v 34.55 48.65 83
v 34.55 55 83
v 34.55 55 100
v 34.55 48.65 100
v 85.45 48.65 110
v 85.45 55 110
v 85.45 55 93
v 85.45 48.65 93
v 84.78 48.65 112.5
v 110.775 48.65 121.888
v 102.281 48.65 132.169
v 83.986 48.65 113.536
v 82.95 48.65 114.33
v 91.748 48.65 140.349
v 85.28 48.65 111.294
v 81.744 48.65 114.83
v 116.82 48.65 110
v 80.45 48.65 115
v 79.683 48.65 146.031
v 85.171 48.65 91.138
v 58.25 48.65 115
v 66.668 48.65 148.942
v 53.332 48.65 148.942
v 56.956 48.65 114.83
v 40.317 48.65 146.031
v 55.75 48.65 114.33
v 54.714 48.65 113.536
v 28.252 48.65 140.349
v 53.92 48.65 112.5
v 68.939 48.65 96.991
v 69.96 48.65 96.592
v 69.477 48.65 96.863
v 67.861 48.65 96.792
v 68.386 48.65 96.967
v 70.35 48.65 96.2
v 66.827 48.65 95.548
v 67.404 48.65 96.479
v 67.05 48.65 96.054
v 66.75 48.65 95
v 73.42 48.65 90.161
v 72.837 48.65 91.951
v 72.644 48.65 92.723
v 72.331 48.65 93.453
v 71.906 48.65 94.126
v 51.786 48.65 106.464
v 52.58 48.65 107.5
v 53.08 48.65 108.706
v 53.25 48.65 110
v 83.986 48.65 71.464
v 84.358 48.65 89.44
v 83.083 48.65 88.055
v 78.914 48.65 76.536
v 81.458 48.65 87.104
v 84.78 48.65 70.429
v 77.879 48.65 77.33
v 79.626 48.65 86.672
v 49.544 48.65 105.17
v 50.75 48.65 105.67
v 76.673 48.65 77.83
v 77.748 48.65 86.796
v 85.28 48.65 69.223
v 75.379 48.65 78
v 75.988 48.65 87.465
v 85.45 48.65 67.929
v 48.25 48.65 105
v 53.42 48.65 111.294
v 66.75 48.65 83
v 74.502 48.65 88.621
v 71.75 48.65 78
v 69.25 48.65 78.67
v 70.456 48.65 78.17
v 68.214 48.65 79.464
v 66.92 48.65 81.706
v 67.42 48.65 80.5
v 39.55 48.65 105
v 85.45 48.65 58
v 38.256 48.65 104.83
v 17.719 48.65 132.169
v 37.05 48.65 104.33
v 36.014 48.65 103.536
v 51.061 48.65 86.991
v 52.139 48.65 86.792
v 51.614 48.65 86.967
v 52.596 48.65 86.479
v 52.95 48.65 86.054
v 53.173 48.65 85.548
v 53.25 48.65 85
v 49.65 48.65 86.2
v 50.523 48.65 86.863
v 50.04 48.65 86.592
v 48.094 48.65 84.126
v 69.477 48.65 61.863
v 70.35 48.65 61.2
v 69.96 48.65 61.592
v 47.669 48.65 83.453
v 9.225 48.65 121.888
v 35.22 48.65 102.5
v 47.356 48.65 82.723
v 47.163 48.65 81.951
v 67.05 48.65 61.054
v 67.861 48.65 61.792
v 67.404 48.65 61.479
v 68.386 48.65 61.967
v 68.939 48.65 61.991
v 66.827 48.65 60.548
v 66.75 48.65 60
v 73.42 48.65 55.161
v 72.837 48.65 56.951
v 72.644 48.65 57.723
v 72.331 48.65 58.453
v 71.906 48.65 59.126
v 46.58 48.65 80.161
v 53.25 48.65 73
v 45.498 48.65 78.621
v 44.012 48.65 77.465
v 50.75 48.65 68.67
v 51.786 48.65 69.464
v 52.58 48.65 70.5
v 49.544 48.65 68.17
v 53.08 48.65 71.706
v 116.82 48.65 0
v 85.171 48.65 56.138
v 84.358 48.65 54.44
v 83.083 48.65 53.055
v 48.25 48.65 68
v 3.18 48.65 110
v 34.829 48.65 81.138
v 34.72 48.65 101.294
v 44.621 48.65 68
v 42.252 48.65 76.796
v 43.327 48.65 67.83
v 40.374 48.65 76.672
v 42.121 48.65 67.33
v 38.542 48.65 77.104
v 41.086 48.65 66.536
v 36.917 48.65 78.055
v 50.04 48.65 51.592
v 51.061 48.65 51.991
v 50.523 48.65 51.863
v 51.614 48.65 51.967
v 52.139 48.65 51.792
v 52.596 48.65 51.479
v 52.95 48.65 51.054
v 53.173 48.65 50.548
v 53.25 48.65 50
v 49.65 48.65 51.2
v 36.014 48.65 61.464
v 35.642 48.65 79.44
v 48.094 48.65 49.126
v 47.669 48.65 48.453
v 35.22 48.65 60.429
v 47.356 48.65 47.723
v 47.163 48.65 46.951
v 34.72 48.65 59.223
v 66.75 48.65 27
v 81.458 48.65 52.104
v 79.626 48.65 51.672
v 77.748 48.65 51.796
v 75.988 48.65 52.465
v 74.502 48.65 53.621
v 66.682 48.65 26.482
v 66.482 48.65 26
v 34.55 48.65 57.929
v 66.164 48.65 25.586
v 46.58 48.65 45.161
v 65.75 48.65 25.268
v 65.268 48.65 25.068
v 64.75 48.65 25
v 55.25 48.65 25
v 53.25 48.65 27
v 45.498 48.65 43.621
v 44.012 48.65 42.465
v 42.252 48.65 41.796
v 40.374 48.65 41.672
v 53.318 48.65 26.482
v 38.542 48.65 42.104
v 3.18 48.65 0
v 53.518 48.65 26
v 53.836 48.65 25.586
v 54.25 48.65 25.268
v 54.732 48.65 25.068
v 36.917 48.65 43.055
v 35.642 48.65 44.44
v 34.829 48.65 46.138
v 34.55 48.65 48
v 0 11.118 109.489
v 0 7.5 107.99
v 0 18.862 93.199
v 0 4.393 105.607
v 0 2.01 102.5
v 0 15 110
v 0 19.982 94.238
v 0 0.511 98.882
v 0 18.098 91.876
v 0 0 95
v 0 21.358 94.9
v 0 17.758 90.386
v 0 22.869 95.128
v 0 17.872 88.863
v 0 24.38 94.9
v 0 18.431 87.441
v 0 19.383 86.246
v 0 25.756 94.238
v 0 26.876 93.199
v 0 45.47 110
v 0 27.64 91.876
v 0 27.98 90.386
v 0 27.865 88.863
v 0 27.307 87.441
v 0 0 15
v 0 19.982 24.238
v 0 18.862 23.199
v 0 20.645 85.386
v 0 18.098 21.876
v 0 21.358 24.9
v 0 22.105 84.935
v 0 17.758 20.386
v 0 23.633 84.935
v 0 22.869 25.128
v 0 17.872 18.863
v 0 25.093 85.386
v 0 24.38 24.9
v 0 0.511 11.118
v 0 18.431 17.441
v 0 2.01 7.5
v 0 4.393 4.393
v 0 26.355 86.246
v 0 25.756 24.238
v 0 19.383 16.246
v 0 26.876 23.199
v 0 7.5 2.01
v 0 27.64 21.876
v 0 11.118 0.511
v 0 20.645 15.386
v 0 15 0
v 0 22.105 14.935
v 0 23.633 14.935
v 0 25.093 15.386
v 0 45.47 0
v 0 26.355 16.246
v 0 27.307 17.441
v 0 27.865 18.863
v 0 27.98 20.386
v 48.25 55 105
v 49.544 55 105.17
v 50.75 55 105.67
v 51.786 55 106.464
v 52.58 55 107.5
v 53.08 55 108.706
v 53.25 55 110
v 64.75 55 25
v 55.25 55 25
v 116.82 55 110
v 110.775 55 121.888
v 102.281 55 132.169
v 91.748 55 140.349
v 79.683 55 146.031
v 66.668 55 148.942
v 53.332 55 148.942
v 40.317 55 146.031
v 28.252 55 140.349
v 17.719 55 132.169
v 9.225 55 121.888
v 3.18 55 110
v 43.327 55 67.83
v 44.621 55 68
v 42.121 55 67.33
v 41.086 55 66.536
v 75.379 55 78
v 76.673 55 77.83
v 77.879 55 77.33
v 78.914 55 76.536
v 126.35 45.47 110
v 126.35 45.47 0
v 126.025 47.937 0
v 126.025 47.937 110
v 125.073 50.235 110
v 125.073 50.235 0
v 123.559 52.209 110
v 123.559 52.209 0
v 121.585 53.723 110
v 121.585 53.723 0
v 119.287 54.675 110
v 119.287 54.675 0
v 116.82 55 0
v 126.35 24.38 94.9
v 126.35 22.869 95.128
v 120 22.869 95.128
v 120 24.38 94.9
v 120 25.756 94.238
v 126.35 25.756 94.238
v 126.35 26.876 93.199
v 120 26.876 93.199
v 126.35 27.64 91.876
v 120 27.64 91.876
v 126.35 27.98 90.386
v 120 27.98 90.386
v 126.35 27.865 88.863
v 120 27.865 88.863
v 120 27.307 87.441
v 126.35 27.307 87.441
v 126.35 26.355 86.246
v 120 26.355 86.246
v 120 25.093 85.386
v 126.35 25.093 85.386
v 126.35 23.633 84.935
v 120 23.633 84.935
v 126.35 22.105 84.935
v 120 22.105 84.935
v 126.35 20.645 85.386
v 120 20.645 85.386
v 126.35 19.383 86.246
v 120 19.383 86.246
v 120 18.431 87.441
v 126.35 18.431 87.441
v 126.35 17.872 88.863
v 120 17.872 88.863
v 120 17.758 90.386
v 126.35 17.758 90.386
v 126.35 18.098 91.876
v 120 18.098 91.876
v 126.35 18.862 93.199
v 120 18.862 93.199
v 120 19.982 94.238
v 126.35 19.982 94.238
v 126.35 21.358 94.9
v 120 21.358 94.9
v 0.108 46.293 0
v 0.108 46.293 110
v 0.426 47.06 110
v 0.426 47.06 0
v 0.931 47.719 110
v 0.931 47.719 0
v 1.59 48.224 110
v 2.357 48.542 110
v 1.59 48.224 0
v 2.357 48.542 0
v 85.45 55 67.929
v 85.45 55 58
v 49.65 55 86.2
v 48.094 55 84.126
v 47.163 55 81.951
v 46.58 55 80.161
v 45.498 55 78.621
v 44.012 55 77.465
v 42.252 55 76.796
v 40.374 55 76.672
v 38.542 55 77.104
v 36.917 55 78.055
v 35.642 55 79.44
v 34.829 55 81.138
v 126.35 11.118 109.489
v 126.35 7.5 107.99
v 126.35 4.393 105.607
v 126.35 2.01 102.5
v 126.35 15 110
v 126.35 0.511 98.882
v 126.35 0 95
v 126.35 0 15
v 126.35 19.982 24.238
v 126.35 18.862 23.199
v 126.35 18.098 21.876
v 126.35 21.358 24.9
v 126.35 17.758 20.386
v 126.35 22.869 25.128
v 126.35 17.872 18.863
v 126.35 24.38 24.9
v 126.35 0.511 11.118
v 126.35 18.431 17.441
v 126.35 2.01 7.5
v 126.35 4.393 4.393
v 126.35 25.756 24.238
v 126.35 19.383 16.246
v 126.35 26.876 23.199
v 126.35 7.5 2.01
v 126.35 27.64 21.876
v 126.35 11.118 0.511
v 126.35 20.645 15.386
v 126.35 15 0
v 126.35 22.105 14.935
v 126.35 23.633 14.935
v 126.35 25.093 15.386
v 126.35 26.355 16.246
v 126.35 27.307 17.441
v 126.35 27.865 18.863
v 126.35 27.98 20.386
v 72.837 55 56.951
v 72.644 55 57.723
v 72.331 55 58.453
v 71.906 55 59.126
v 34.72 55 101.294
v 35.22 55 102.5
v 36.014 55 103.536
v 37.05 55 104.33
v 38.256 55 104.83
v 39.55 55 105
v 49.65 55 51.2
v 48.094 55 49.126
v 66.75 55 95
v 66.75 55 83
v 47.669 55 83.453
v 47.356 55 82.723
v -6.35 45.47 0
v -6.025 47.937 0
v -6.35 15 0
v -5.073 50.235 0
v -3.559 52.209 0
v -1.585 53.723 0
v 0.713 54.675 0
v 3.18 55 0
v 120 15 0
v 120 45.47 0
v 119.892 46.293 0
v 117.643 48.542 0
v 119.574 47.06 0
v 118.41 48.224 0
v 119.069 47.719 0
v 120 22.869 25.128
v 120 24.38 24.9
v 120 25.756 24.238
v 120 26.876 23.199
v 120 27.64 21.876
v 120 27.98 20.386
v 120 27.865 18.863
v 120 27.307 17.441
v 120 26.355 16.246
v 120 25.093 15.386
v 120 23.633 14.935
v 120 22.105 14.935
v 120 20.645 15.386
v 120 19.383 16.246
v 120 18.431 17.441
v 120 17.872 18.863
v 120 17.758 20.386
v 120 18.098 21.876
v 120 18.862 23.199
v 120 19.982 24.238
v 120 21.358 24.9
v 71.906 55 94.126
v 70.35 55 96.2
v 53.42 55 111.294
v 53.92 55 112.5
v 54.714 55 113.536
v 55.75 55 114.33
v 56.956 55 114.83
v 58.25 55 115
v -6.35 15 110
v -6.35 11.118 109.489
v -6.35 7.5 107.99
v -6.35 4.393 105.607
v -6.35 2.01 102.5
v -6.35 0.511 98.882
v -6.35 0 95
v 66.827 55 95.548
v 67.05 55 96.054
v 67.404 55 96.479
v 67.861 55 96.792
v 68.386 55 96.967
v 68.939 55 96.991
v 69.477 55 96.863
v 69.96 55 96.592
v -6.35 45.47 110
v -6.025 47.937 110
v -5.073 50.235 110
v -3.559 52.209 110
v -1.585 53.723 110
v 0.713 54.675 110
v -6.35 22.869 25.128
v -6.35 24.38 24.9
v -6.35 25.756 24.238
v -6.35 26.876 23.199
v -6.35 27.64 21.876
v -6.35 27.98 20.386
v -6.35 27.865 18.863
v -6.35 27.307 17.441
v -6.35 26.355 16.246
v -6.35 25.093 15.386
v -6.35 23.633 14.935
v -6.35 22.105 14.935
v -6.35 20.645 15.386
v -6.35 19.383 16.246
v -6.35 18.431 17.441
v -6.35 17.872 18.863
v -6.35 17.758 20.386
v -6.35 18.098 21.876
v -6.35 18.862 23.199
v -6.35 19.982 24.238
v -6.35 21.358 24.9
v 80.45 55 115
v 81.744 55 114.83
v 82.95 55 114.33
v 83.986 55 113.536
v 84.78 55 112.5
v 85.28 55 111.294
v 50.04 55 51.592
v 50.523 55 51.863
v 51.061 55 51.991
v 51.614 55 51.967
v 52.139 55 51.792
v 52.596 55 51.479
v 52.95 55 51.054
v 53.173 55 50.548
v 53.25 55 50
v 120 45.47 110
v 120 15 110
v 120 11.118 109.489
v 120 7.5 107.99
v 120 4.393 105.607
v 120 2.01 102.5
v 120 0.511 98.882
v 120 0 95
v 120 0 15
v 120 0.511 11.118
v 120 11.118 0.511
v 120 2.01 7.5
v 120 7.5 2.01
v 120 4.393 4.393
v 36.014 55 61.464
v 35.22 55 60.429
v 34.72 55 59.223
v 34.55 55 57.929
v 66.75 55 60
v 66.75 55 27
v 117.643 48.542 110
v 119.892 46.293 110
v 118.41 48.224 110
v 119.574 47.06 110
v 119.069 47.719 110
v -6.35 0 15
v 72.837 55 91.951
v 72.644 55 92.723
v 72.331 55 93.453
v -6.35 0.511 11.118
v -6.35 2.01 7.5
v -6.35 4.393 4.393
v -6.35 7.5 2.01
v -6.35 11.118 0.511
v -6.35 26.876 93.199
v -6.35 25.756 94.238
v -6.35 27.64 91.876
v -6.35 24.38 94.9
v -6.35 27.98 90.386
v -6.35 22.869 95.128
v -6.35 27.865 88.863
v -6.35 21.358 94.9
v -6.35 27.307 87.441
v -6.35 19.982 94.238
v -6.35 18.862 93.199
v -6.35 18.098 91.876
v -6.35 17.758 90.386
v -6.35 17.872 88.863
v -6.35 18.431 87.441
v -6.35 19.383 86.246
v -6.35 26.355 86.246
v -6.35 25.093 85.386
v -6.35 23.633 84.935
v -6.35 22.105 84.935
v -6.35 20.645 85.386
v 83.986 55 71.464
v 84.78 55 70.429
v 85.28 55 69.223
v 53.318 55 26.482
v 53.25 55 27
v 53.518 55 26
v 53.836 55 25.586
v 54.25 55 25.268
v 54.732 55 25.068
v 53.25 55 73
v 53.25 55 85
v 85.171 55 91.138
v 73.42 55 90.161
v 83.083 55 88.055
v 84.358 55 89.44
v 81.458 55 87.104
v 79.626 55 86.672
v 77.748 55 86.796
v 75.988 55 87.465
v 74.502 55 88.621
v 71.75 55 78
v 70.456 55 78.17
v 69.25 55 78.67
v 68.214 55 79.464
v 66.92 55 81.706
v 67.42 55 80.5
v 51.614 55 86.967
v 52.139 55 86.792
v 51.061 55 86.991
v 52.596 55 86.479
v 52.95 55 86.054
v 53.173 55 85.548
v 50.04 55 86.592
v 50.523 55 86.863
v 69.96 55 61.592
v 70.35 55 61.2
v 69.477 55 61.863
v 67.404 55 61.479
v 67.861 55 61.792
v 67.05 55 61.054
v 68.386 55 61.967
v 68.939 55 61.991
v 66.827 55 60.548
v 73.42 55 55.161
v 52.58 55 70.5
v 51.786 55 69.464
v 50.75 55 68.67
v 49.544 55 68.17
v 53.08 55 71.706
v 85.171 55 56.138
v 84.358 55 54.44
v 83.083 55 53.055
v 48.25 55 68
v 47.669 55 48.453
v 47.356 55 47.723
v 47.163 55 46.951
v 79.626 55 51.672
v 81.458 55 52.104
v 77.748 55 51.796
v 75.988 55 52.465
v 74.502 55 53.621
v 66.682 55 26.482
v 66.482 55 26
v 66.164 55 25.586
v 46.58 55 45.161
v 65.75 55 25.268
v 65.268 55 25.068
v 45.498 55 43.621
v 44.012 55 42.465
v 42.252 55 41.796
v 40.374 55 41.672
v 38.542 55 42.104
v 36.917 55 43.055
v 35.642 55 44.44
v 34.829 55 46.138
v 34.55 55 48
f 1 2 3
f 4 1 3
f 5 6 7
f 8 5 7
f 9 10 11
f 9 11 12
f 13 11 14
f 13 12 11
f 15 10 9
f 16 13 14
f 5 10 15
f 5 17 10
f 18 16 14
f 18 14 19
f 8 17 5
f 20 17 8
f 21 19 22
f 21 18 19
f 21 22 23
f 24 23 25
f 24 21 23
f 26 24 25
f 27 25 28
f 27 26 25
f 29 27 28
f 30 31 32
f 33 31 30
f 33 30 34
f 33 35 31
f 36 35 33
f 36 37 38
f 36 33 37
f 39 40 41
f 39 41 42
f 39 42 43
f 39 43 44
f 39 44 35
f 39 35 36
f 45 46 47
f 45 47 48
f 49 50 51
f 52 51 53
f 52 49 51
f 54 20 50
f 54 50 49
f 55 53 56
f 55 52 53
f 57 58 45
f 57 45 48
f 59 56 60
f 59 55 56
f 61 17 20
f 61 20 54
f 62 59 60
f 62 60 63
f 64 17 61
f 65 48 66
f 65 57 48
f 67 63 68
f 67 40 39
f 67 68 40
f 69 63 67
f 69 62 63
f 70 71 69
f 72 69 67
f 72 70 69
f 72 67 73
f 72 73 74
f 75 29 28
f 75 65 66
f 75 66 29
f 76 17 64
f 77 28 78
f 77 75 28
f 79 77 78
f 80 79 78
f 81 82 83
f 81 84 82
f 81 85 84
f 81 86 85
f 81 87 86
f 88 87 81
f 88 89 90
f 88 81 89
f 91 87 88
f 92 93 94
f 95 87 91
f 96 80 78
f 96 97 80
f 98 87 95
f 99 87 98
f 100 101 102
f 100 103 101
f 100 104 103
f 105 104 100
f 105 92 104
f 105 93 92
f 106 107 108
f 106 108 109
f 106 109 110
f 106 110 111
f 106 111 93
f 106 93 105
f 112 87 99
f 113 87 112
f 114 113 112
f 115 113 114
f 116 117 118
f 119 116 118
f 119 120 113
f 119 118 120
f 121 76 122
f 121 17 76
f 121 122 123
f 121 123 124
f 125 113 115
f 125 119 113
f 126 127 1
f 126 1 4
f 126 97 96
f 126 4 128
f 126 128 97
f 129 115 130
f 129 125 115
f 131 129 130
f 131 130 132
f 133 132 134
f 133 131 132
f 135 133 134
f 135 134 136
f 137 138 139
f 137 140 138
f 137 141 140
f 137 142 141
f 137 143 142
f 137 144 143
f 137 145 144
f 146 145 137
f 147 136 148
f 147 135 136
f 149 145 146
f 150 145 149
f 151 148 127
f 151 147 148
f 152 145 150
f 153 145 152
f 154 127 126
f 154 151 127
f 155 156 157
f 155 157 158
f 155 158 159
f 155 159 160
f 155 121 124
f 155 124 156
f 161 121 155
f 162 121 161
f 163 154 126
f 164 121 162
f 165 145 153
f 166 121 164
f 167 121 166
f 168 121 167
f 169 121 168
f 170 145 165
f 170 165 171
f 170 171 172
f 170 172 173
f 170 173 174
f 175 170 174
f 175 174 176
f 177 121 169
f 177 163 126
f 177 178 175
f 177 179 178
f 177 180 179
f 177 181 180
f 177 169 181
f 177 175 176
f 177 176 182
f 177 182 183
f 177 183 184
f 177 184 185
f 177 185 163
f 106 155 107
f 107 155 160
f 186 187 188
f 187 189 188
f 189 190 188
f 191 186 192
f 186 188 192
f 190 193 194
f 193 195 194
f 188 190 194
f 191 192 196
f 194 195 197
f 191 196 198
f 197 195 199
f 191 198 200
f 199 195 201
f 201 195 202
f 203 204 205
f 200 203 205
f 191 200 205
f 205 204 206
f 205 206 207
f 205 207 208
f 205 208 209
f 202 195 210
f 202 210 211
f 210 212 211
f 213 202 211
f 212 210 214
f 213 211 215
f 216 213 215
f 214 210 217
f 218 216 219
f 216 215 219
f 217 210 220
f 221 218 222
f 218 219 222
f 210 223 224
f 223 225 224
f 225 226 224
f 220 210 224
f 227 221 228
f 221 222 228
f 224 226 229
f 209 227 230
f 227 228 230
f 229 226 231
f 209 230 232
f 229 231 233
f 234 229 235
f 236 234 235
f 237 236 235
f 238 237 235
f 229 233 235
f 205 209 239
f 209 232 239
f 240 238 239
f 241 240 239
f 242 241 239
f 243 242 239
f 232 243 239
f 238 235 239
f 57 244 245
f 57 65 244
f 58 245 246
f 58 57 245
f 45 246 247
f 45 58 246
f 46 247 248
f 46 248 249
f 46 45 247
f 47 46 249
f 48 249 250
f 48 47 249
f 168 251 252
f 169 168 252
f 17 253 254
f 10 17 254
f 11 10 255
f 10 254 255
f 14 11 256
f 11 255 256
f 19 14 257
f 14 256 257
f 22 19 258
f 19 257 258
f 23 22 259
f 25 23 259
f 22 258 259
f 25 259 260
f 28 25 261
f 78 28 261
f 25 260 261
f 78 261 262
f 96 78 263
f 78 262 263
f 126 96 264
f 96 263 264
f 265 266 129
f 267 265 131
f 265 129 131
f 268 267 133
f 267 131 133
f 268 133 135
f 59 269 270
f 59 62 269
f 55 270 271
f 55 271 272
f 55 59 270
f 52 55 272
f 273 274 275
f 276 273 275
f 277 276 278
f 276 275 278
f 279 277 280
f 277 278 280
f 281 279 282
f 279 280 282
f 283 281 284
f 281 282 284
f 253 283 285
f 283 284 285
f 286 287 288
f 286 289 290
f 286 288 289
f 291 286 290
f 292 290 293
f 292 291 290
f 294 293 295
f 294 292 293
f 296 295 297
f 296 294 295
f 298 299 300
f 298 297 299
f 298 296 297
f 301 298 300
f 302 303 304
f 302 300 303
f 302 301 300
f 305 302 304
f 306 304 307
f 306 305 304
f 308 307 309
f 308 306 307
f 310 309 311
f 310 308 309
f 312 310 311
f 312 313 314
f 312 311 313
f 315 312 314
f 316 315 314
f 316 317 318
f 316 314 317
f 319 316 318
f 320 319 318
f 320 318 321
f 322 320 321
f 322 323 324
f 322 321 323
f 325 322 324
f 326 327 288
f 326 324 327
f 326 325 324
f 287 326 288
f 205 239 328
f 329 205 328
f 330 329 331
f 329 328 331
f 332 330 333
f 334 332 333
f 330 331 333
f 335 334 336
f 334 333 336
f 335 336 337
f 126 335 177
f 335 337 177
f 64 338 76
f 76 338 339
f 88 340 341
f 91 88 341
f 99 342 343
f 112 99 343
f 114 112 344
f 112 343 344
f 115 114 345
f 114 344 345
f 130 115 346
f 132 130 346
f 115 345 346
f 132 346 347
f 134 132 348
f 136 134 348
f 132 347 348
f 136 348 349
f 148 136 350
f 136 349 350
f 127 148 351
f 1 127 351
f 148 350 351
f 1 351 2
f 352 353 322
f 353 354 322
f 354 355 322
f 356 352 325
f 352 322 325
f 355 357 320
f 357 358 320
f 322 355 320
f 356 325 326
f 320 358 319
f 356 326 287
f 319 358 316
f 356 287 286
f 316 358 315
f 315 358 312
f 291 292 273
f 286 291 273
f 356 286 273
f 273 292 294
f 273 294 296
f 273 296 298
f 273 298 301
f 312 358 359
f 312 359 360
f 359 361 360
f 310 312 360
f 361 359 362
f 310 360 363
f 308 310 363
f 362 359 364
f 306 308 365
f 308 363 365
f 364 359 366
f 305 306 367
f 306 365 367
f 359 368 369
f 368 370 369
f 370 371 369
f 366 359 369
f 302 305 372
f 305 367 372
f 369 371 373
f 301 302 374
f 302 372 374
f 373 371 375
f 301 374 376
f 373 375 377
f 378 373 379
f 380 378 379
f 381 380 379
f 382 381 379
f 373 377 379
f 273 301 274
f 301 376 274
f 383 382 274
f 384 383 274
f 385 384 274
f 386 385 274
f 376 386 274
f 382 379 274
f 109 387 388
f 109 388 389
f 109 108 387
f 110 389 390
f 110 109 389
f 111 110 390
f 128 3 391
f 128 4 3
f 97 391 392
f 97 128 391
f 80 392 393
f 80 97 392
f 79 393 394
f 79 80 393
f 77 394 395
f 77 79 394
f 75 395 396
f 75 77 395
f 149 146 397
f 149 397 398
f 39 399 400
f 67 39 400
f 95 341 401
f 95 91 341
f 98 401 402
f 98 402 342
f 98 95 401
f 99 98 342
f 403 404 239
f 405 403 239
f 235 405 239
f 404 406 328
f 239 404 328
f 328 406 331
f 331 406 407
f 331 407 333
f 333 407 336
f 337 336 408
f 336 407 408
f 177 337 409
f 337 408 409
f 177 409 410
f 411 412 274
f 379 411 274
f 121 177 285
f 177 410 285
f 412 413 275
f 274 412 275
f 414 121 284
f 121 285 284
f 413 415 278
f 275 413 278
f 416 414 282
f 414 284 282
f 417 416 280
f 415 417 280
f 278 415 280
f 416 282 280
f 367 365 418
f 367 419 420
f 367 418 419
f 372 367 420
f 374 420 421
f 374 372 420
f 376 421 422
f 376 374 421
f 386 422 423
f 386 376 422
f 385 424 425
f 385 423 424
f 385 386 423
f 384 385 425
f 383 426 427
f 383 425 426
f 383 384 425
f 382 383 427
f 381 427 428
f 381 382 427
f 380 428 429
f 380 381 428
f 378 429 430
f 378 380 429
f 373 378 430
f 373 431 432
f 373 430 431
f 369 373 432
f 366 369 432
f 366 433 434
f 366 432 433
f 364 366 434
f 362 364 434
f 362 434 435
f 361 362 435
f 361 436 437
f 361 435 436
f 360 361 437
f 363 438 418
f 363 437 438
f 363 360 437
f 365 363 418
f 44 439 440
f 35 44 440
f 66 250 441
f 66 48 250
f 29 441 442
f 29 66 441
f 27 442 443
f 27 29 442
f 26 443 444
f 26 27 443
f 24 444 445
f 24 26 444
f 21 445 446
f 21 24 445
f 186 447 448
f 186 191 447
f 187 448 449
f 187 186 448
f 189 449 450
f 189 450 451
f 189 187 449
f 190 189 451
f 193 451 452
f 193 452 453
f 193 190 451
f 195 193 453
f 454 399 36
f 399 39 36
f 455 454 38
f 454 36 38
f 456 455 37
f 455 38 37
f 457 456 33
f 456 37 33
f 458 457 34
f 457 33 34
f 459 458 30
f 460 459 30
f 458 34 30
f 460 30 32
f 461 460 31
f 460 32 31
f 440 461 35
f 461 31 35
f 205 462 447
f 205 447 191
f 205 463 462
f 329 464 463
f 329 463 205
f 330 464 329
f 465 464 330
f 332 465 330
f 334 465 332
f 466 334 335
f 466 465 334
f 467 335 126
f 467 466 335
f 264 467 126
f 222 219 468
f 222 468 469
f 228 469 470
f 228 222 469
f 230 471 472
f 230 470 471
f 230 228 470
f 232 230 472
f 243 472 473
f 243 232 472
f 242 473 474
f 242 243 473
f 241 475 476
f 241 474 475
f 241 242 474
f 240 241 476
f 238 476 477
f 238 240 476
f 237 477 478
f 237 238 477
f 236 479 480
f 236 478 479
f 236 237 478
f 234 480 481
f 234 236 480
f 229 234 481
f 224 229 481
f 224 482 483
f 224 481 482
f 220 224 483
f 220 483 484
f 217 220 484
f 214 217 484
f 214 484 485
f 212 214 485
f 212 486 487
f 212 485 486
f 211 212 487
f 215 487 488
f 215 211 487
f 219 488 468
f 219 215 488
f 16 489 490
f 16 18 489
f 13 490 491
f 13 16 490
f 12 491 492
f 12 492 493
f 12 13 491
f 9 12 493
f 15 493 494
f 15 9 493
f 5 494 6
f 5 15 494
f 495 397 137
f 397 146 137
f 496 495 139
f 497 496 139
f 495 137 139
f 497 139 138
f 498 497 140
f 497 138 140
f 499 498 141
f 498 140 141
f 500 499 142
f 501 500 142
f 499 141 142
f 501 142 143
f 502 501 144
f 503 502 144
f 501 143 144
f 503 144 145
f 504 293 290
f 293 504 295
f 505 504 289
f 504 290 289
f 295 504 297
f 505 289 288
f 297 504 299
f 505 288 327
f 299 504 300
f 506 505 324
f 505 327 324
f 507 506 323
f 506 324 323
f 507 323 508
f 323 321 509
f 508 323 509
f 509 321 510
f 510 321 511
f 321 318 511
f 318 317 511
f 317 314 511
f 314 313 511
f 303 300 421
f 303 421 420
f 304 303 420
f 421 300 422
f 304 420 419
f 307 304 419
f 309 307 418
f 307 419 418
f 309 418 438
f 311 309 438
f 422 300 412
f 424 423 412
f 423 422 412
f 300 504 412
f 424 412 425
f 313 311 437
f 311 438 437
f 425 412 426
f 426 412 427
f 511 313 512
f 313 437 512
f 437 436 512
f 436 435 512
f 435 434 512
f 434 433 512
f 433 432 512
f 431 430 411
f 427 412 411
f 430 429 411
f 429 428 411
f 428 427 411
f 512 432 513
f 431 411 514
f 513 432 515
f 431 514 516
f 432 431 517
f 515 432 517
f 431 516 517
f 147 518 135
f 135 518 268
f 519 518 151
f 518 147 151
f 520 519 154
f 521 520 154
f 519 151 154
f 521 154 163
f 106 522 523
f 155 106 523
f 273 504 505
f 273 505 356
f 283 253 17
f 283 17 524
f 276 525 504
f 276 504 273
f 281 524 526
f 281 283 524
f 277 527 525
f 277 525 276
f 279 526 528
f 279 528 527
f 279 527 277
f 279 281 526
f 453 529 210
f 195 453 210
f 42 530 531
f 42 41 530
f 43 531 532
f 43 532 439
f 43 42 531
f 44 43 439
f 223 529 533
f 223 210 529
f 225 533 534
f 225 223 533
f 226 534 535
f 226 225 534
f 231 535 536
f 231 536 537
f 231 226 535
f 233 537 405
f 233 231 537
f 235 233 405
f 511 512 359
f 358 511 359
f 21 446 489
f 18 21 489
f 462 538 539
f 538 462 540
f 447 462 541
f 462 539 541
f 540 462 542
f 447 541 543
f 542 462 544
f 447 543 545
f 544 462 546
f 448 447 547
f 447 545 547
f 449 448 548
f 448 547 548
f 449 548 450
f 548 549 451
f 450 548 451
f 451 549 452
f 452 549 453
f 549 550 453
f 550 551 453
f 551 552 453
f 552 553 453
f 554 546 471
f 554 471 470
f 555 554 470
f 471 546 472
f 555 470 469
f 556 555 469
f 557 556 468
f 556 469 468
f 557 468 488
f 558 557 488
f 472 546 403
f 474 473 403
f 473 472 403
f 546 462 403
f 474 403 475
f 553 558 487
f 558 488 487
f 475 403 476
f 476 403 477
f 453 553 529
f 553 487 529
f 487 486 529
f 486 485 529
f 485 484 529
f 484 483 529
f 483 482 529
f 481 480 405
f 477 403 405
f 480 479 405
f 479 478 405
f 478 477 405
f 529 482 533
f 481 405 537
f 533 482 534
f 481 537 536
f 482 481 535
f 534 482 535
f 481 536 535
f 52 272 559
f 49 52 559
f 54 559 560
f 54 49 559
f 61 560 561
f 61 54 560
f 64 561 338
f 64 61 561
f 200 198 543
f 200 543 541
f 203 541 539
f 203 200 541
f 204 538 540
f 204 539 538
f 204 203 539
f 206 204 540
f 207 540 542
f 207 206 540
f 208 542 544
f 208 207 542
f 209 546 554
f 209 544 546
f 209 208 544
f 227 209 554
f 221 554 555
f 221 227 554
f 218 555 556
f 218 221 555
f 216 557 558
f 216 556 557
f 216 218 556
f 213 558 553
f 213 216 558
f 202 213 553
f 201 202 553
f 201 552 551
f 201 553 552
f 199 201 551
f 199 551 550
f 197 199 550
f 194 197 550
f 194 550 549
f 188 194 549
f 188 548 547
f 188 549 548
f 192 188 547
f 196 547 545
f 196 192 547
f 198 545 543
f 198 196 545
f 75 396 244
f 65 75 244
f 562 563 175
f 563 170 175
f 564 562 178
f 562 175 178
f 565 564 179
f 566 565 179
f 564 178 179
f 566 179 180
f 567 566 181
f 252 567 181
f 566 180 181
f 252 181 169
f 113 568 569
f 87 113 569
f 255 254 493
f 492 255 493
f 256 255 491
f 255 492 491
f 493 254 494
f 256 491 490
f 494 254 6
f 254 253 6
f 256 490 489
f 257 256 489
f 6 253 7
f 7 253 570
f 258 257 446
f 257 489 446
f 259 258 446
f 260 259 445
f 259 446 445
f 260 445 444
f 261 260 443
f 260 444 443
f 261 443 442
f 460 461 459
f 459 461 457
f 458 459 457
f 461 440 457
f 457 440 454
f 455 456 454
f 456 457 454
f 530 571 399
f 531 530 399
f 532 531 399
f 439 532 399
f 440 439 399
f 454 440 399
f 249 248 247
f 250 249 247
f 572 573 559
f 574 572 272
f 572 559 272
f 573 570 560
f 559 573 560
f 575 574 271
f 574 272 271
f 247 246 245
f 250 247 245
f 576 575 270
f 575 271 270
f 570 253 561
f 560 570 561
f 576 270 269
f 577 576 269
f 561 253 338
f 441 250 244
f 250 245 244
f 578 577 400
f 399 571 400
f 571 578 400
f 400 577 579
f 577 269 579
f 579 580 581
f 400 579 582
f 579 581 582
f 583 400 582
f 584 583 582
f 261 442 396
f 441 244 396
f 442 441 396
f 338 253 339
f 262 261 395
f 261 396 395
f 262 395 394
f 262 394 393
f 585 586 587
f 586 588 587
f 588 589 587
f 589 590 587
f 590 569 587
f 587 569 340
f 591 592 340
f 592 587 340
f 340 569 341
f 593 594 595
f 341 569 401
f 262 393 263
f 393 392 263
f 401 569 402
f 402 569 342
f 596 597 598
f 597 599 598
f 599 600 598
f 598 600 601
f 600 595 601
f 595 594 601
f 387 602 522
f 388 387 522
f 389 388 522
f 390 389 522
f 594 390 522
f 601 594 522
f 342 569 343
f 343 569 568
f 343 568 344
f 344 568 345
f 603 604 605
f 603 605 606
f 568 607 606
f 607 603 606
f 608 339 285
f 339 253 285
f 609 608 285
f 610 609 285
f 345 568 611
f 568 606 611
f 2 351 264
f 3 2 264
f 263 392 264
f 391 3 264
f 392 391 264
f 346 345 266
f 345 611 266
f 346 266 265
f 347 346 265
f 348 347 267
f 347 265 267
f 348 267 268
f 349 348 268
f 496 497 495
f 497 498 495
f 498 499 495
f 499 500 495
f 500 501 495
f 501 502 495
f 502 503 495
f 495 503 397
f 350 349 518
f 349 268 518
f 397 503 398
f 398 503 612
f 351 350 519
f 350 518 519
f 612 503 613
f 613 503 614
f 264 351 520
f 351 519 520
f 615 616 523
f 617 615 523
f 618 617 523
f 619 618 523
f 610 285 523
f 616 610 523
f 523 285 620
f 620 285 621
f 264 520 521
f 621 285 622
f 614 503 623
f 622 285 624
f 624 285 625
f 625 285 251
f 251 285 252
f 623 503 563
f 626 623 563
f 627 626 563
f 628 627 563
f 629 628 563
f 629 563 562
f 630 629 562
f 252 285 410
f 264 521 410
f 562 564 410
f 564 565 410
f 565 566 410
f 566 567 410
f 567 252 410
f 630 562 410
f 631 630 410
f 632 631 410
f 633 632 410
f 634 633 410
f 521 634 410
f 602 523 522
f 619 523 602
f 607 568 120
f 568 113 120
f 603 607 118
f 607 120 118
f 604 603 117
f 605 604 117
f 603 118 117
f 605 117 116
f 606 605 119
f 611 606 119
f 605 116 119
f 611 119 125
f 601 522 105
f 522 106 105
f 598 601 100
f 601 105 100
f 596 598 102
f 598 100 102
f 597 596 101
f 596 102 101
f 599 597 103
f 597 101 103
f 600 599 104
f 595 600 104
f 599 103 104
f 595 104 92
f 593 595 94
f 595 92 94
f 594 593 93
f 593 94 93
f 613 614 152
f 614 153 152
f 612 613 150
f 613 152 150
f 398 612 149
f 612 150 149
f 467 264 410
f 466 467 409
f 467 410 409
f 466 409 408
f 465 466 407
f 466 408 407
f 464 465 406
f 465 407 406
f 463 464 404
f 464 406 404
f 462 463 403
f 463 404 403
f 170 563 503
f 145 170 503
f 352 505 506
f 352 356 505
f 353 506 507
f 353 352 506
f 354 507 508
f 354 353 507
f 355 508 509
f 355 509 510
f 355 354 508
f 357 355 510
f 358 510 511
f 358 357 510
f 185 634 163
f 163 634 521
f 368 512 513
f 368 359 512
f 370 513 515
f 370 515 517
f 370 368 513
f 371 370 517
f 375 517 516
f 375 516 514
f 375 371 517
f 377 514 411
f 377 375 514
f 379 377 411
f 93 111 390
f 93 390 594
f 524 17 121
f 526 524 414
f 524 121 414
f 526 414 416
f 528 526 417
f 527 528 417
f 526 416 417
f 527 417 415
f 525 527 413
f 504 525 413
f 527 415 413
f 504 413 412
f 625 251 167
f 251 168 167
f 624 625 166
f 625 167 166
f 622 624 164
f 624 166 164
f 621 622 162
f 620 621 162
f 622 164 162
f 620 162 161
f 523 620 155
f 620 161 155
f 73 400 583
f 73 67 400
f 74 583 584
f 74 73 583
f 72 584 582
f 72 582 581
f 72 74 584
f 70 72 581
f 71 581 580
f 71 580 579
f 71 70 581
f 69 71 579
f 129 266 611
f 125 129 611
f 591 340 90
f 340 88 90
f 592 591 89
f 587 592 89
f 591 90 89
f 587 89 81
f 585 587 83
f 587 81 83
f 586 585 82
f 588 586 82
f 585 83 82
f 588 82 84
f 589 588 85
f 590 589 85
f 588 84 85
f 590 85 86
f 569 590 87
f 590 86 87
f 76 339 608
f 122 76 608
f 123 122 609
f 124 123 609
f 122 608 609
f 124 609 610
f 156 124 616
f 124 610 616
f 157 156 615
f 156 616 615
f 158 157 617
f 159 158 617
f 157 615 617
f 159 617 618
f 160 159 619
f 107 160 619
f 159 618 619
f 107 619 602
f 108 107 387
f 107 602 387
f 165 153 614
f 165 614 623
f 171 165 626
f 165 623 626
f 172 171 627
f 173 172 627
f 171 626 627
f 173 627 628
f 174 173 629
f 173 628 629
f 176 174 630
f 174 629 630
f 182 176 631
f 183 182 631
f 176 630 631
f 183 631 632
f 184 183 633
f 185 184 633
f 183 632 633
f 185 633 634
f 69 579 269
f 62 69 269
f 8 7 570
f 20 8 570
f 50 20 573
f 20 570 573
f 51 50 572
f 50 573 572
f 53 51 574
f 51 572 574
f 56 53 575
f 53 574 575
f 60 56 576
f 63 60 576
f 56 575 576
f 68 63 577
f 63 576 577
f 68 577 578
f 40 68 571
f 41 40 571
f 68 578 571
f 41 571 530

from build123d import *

# Parameters (mm, degrees)
BRIDA_BASE1_DEPTH          = 110
PESTA_A1_DEPTH             = 6.35
CORTAR_EXTRUIR1_REACH      = 205.181
REDONDEO1_R                = 15
CORTAR_EXTRUIR3_DEPTH      = 204.181381454
CORTAR_EXTRUIR3_DEPTH_BACK = 204.181381454
CROQUIS11_R                = 5.125
REDONDEO2_R                = 2
REDONDEO3_R                = 5


# Sheet-metal steps are written as plain solids
with BuildPart() as part:
    # Croquis1 → Brida base1 (new body)
    with BuildSketch(Plane.XY):
        with BuildLine():
            Line((0, 0), (0, 45.47))
            ThreePointArc((0, 45.47), (0.931400436, 47.718599564), (3.18, 48.65))
            Line((3.18, 48.65), (116.82, 48.65))
            ThreePointArc((116.82, 48.65), (119.068599564, 47.718599564), (120, 45.47))
            Line((120, 45.47), (120, 0))
            Line((120, 0), (126.35, 0))
            Line((126.35, 0), (126.35, 45.47))
            ThreePointArc((126.35, 45.47), (123.558727625, 52.208727625), (116.82, 55))
            Line((116.82, 55), (3.18, 55))
            ThreePointArc((3.18, 55), (-3.558727625, 52.208727625), (-6.35, 45.47))
            Line((-6.35, 45.47), (-6.35, 0))
            Line((-6.35, 0), (0, 0))
        make_face()
    extrude(amount=BRIDA_BASE1_DEPTH)

    # Croquis6 → Pestaña1 (add)
    with BuildSketch(Plane(origin=(0, 55, 0), x_dir=(1, 0, 0), z_dir=(0, 1, 0))):
        with BuildLine():
            Line((3.18, -110), (116.82, -110))
            ThreePointArc((116.82, -110), (60, -149.309581975), (3.18, -110))
        make_face()
    extrude(amount=-PESTA_A1_DEPTH)

    # Croquis9 → Cortar-Extruir1 (cut, up to next)
    with BuildSketch(Plane(origin=(0, 55, 0), x_dir=(1, 0, 0), z_dir=(0, 1, 0)), mode=Mode.PRIVATE) as cortar_extruir1_sk1:
        with BuildLine():
            Line((53.25, -115), (85.45, -115))
            Line((85.45, -115), (85.45, -93))
            ThreePointArc((85.45, -93), (79.1, -86.65), (72.75, -93))
            Line((72.75, -93), (66.75, -101))
            Line((66.75, -101), (66.75, -78))
            Line((66.75, -78), (77.45, -78))
            Line((77.45, -78), (85.45, -70))
            Line((85.45, -70), (85.45, -58))
            ThreePointArc((85.45, -58), (79.1, -51.65), (72.75, -58))
            Line((72.75, -58), (66.75, -66))
            Line((66.75, -66), (66.75, -25))
            Line((66.75, -25), (53.25, -25))
            Line((53.25, -25), (53.25, -56))
            Line((53.25, -56), (47.25, -48))
            ThreePointArc((47.25, -48), (40.9, -41.65), (34.55, -48))
            Line((34.55, -48), (34.55, -60))
            Line((34.55, -60), (42.55, -68))
            Line((42.55, -68), (53.25, -68))
            Line((53.25, -68), (53.25, -91))
            Line((53.25, -91), (47.25, -83))
            ThreePointArc((47.25, -83), (40.9, -76.65), (34.55, -83))
            Line((34.55, -83), (34.55, -105))
            Line((34.55, -105), (53.25, -105))
            Line((53.25, -105), (53.25, -115))
        make_face()
    cortar_extruir1_tool1 = extrude(cortar_extruir1_sk1.sketch, amount=-CORTAR_EXTRUIR1_REACH, mode=Mode.PRIVATE) & part.part
    add(cortar_extruir1_tool1.solids().sort_by_distance((60, 55, 76.162835))[0], mode=Mode.SUBTRACT)

    # Redondeo1
    redondeo1_edges = [part.edges().sort_by_distance(p)[0] for p in [
        (-3.175, 0, 0),
        (123.175, 0, 0),
        (-3.175, 0, 110),
        (123.175, 0, 110),
    ]]
    fillet(redondeo1_edges, radius=REDONDEO1_R)

    # Croquis11 → Cortar-Extruir3 (cut, two sides: drawn at the far end of the back side and taken through both)
    with BuildSketch(Plane.ZY.offset(-120).offset(-CORTAR_EXTRUIR3_DEPTH_BACK)):
        with Locations((20.003172622, 22.868986368)):
            Circle(CROQUIS11_R)
        with Locations((90.003172622, 22.868986368)):
            Circle(CROQUIS11_R)
    extrude(amount=CORTAR_EXTRUIR3_DEPTH + CORTAR_EXTRUIR3_DEPTH_BACK, mode=Mode.SUBTRACT)

    # Redondeo2
    redondeo2_edges = [part.edges().sort_by_distance(p)[0] for p in [
        (53.25, 51.825, 56),
        (53.25, 51.825, 25),
        (66.75, 51.825, 25),
        (66.75, 51.825, 66),
        (66.75, 51.825, 101),
        (53.25, 51.825, 91),
    ]]
    fillet(redondeo2_edges, radius=REDONDEO2_R)

    # Redondeo3
    redondeo3_edges = [part.edges().sort_by_distance(p)[0] for p in [
        (34.55, 51.825, 60),
        (47.25, 51.825, 48),
        (72.75, 51.825, 58),
        (85.45, 51.825, 70),
        (77.45, 51.825, 78),
        (66.75, 51.825, 78),
        (72.75, 51.825, 93),
        (85.45, 51.825, 115),
        (53.25, 51.825, 115),
        (53.25, 51.825, 105),
        (34.55, 51.825, 105),
        (47.25, 51.825, 83),
        (53.25, 51.825, 68),
        (42.55, 51.825, 68),
    ]]
    fillet(redondeo3_edges, radius=REDONDEO3_R - 0.0001)  # a hair under: the kernel refuses the full size


solid = part.part
